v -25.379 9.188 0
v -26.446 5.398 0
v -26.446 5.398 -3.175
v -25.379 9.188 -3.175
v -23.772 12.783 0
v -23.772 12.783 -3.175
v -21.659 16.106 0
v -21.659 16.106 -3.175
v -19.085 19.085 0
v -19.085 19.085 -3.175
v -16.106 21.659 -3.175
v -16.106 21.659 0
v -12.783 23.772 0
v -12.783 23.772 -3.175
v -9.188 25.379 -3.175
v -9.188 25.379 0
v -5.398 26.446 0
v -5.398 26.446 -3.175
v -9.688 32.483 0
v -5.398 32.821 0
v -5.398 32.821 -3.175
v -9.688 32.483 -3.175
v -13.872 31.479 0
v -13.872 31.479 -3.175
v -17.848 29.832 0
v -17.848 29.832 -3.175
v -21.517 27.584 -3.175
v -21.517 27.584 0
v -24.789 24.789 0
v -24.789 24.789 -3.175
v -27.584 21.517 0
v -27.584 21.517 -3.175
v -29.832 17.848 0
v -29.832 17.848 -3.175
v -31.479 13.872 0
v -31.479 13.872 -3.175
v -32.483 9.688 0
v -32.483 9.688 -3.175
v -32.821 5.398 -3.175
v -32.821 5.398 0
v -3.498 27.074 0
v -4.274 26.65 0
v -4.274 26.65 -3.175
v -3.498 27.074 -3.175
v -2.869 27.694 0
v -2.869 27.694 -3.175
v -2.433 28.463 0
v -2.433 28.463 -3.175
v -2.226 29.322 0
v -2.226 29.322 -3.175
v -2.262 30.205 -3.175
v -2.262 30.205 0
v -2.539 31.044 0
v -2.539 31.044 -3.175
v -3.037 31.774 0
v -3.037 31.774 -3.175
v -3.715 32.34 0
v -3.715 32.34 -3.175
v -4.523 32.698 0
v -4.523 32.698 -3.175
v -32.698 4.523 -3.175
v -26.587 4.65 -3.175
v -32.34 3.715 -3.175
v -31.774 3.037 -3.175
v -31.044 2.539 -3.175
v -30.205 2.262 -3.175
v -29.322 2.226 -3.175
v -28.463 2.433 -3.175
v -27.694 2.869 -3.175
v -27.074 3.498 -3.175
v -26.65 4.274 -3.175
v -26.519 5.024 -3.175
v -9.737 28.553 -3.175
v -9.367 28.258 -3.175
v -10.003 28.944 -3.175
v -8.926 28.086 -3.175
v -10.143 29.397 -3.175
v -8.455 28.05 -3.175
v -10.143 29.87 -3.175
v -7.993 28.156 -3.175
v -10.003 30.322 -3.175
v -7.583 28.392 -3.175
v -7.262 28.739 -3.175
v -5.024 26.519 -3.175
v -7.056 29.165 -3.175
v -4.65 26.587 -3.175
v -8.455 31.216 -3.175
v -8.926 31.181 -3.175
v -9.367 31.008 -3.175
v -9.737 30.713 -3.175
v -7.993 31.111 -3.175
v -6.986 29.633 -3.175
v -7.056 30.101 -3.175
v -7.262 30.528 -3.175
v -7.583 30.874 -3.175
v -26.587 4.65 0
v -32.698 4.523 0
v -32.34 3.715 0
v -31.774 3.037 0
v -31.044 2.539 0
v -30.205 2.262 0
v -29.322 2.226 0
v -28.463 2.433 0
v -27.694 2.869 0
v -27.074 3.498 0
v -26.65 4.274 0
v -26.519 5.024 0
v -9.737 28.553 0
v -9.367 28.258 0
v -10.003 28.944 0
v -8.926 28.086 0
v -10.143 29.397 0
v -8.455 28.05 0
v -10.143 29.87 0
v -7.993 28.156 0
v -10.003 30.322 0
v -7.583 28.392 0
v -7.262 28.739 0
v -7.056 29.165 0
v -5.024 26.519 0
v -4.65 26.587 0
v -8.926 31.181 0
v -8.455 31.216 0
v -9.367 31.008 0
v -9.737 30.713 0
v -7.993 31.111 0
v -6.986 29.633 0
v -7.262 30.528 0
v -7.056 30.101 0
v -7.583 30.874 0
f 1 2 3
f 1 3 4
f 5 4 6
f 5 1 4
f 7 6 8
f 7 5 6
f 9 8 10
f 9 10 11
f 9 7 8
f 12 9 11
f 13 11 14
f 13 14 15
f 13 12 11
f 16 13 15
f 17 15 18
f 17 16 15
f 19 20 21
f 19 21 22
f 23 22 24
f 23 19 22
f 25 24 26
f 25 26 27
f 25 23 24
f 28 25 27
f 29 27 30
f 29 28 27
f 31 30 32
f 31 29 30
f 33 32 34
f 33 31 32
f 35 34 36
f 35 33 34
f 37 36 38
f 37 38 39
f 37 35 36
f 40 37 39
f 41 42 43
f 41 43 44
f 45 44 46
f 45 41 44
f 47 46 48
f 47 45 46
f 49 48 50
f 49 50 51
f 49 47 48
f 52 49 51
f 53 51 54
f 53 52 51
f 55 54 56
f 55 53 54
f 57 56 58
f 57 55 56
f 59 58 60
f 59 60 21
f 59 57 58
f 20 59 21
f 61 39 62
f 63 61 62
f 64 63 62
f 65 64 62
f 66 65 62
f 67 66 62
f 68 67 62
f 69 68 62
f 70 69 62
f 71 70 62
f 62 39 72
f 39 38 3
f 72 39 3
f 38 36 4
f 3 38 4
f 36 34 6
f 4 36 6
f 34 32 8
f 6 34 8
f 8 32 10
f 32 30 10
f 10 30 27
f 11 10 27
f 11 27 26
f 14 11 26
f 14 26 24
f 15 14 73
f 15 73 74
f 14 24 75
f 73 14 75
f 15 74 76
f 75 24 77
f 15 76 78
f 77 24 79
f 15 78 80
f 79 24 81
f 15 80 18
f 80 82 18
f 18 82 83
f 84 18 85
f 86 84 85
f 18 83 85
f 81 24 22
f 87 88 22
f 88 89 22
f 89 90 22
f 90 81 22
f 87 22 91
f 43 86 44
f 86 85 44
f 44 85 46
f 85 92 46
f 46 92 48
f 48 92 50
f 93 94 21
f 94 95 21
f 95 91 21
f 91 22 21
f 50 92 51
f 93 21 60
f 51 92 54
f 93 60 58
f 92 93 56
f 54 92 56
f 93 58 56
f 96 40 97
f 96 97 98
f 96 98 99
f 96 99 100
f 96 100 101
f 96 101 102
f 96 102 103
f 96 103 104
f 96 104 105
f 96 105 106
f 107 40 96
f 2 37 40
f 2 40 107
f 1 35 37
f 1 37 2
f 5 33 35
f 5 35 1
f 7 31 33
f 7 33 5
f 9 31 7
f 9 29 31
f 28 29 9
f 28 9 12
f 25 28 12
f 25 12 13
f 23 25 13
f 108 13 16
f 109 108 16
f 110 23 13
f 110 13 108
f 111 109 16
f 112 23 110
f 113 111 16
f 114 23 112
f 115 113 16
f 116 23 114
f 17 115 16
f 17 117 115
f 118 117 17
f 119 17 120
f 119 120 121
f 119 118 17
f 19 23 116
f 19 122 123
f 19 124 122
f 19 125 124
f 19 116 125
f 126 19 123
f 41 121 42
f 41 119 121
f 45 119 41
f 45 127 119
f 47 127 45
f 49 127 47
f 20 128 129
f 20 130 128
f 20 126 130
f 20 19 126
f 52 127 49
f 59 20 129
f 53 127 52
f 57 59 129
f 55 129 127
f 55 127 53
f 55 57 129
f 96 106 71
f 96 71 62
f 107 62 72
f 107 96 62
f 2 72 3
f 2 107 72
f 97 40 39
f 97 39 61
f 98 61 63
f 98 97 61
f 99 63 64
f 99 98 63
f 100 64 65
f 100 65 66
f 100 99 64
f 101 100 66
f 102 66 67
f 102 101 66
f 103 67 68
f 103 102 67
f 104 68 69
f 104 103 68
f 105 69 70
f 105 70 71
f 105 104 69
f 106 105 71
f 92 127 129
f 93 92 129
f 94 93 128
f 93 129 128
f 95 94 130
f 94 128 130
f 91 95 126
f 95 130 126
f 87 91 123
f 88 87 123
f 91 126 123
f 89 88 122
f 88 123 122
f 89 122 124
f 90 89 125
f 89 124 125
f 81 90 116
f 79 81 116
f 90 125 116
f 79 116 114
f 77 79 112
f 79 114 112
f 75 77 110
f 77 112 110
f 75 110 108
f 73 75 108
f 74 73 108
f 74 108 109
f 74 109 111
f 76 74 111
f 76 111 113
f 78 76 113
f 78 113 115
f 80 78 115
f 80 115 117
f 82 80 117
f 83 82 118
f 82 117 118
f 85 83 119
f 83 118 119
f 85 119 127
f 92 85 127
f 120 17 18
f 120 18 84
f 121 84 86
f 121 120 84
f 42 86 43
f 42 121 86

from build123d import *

# Parameters (mm, degrees)
F0_R     = 1.5875
F1_DEPTH = 3.175


with BuildPart() as f1:
    # F0 (on Top) → F1 (new body)
    with BuildSketch(Plane.XY):
        with BuildLine():
            ThreePointArc((-5.398182, 26.445581), (-4.837228, 26.553914), (-4.274107, 26.65035))
            ThreePointArc((-4.274107, 26.65035), (-2.26211, 30.204549), (-5.398182, 32.820944))
            ThreePointArc((-5.398182, 32.820944), (-24.789003, 24.789003), (-32.820944, 5.398182))
            ThreePointArc((-32.820944, 5.398182), (-30.204549, 2.26211), (-26.65035, 4.274107))
            ThreePointArc((-26.65035, 4.274107), (-26.553914, 4.837228), (-26.445581, 5.398182))
            ThreePointArc((-26.445581, 5.398182), (-19.085454, 19.085454), (-5.398182, 26.445581))
        make_face()
        with Locations((-8.573182, 29.633263)):
            Circle(F0_R, mode=Mode.SUBTRACT)
    extrude(amount=-F1_DEPTH)


solid = f1.part
